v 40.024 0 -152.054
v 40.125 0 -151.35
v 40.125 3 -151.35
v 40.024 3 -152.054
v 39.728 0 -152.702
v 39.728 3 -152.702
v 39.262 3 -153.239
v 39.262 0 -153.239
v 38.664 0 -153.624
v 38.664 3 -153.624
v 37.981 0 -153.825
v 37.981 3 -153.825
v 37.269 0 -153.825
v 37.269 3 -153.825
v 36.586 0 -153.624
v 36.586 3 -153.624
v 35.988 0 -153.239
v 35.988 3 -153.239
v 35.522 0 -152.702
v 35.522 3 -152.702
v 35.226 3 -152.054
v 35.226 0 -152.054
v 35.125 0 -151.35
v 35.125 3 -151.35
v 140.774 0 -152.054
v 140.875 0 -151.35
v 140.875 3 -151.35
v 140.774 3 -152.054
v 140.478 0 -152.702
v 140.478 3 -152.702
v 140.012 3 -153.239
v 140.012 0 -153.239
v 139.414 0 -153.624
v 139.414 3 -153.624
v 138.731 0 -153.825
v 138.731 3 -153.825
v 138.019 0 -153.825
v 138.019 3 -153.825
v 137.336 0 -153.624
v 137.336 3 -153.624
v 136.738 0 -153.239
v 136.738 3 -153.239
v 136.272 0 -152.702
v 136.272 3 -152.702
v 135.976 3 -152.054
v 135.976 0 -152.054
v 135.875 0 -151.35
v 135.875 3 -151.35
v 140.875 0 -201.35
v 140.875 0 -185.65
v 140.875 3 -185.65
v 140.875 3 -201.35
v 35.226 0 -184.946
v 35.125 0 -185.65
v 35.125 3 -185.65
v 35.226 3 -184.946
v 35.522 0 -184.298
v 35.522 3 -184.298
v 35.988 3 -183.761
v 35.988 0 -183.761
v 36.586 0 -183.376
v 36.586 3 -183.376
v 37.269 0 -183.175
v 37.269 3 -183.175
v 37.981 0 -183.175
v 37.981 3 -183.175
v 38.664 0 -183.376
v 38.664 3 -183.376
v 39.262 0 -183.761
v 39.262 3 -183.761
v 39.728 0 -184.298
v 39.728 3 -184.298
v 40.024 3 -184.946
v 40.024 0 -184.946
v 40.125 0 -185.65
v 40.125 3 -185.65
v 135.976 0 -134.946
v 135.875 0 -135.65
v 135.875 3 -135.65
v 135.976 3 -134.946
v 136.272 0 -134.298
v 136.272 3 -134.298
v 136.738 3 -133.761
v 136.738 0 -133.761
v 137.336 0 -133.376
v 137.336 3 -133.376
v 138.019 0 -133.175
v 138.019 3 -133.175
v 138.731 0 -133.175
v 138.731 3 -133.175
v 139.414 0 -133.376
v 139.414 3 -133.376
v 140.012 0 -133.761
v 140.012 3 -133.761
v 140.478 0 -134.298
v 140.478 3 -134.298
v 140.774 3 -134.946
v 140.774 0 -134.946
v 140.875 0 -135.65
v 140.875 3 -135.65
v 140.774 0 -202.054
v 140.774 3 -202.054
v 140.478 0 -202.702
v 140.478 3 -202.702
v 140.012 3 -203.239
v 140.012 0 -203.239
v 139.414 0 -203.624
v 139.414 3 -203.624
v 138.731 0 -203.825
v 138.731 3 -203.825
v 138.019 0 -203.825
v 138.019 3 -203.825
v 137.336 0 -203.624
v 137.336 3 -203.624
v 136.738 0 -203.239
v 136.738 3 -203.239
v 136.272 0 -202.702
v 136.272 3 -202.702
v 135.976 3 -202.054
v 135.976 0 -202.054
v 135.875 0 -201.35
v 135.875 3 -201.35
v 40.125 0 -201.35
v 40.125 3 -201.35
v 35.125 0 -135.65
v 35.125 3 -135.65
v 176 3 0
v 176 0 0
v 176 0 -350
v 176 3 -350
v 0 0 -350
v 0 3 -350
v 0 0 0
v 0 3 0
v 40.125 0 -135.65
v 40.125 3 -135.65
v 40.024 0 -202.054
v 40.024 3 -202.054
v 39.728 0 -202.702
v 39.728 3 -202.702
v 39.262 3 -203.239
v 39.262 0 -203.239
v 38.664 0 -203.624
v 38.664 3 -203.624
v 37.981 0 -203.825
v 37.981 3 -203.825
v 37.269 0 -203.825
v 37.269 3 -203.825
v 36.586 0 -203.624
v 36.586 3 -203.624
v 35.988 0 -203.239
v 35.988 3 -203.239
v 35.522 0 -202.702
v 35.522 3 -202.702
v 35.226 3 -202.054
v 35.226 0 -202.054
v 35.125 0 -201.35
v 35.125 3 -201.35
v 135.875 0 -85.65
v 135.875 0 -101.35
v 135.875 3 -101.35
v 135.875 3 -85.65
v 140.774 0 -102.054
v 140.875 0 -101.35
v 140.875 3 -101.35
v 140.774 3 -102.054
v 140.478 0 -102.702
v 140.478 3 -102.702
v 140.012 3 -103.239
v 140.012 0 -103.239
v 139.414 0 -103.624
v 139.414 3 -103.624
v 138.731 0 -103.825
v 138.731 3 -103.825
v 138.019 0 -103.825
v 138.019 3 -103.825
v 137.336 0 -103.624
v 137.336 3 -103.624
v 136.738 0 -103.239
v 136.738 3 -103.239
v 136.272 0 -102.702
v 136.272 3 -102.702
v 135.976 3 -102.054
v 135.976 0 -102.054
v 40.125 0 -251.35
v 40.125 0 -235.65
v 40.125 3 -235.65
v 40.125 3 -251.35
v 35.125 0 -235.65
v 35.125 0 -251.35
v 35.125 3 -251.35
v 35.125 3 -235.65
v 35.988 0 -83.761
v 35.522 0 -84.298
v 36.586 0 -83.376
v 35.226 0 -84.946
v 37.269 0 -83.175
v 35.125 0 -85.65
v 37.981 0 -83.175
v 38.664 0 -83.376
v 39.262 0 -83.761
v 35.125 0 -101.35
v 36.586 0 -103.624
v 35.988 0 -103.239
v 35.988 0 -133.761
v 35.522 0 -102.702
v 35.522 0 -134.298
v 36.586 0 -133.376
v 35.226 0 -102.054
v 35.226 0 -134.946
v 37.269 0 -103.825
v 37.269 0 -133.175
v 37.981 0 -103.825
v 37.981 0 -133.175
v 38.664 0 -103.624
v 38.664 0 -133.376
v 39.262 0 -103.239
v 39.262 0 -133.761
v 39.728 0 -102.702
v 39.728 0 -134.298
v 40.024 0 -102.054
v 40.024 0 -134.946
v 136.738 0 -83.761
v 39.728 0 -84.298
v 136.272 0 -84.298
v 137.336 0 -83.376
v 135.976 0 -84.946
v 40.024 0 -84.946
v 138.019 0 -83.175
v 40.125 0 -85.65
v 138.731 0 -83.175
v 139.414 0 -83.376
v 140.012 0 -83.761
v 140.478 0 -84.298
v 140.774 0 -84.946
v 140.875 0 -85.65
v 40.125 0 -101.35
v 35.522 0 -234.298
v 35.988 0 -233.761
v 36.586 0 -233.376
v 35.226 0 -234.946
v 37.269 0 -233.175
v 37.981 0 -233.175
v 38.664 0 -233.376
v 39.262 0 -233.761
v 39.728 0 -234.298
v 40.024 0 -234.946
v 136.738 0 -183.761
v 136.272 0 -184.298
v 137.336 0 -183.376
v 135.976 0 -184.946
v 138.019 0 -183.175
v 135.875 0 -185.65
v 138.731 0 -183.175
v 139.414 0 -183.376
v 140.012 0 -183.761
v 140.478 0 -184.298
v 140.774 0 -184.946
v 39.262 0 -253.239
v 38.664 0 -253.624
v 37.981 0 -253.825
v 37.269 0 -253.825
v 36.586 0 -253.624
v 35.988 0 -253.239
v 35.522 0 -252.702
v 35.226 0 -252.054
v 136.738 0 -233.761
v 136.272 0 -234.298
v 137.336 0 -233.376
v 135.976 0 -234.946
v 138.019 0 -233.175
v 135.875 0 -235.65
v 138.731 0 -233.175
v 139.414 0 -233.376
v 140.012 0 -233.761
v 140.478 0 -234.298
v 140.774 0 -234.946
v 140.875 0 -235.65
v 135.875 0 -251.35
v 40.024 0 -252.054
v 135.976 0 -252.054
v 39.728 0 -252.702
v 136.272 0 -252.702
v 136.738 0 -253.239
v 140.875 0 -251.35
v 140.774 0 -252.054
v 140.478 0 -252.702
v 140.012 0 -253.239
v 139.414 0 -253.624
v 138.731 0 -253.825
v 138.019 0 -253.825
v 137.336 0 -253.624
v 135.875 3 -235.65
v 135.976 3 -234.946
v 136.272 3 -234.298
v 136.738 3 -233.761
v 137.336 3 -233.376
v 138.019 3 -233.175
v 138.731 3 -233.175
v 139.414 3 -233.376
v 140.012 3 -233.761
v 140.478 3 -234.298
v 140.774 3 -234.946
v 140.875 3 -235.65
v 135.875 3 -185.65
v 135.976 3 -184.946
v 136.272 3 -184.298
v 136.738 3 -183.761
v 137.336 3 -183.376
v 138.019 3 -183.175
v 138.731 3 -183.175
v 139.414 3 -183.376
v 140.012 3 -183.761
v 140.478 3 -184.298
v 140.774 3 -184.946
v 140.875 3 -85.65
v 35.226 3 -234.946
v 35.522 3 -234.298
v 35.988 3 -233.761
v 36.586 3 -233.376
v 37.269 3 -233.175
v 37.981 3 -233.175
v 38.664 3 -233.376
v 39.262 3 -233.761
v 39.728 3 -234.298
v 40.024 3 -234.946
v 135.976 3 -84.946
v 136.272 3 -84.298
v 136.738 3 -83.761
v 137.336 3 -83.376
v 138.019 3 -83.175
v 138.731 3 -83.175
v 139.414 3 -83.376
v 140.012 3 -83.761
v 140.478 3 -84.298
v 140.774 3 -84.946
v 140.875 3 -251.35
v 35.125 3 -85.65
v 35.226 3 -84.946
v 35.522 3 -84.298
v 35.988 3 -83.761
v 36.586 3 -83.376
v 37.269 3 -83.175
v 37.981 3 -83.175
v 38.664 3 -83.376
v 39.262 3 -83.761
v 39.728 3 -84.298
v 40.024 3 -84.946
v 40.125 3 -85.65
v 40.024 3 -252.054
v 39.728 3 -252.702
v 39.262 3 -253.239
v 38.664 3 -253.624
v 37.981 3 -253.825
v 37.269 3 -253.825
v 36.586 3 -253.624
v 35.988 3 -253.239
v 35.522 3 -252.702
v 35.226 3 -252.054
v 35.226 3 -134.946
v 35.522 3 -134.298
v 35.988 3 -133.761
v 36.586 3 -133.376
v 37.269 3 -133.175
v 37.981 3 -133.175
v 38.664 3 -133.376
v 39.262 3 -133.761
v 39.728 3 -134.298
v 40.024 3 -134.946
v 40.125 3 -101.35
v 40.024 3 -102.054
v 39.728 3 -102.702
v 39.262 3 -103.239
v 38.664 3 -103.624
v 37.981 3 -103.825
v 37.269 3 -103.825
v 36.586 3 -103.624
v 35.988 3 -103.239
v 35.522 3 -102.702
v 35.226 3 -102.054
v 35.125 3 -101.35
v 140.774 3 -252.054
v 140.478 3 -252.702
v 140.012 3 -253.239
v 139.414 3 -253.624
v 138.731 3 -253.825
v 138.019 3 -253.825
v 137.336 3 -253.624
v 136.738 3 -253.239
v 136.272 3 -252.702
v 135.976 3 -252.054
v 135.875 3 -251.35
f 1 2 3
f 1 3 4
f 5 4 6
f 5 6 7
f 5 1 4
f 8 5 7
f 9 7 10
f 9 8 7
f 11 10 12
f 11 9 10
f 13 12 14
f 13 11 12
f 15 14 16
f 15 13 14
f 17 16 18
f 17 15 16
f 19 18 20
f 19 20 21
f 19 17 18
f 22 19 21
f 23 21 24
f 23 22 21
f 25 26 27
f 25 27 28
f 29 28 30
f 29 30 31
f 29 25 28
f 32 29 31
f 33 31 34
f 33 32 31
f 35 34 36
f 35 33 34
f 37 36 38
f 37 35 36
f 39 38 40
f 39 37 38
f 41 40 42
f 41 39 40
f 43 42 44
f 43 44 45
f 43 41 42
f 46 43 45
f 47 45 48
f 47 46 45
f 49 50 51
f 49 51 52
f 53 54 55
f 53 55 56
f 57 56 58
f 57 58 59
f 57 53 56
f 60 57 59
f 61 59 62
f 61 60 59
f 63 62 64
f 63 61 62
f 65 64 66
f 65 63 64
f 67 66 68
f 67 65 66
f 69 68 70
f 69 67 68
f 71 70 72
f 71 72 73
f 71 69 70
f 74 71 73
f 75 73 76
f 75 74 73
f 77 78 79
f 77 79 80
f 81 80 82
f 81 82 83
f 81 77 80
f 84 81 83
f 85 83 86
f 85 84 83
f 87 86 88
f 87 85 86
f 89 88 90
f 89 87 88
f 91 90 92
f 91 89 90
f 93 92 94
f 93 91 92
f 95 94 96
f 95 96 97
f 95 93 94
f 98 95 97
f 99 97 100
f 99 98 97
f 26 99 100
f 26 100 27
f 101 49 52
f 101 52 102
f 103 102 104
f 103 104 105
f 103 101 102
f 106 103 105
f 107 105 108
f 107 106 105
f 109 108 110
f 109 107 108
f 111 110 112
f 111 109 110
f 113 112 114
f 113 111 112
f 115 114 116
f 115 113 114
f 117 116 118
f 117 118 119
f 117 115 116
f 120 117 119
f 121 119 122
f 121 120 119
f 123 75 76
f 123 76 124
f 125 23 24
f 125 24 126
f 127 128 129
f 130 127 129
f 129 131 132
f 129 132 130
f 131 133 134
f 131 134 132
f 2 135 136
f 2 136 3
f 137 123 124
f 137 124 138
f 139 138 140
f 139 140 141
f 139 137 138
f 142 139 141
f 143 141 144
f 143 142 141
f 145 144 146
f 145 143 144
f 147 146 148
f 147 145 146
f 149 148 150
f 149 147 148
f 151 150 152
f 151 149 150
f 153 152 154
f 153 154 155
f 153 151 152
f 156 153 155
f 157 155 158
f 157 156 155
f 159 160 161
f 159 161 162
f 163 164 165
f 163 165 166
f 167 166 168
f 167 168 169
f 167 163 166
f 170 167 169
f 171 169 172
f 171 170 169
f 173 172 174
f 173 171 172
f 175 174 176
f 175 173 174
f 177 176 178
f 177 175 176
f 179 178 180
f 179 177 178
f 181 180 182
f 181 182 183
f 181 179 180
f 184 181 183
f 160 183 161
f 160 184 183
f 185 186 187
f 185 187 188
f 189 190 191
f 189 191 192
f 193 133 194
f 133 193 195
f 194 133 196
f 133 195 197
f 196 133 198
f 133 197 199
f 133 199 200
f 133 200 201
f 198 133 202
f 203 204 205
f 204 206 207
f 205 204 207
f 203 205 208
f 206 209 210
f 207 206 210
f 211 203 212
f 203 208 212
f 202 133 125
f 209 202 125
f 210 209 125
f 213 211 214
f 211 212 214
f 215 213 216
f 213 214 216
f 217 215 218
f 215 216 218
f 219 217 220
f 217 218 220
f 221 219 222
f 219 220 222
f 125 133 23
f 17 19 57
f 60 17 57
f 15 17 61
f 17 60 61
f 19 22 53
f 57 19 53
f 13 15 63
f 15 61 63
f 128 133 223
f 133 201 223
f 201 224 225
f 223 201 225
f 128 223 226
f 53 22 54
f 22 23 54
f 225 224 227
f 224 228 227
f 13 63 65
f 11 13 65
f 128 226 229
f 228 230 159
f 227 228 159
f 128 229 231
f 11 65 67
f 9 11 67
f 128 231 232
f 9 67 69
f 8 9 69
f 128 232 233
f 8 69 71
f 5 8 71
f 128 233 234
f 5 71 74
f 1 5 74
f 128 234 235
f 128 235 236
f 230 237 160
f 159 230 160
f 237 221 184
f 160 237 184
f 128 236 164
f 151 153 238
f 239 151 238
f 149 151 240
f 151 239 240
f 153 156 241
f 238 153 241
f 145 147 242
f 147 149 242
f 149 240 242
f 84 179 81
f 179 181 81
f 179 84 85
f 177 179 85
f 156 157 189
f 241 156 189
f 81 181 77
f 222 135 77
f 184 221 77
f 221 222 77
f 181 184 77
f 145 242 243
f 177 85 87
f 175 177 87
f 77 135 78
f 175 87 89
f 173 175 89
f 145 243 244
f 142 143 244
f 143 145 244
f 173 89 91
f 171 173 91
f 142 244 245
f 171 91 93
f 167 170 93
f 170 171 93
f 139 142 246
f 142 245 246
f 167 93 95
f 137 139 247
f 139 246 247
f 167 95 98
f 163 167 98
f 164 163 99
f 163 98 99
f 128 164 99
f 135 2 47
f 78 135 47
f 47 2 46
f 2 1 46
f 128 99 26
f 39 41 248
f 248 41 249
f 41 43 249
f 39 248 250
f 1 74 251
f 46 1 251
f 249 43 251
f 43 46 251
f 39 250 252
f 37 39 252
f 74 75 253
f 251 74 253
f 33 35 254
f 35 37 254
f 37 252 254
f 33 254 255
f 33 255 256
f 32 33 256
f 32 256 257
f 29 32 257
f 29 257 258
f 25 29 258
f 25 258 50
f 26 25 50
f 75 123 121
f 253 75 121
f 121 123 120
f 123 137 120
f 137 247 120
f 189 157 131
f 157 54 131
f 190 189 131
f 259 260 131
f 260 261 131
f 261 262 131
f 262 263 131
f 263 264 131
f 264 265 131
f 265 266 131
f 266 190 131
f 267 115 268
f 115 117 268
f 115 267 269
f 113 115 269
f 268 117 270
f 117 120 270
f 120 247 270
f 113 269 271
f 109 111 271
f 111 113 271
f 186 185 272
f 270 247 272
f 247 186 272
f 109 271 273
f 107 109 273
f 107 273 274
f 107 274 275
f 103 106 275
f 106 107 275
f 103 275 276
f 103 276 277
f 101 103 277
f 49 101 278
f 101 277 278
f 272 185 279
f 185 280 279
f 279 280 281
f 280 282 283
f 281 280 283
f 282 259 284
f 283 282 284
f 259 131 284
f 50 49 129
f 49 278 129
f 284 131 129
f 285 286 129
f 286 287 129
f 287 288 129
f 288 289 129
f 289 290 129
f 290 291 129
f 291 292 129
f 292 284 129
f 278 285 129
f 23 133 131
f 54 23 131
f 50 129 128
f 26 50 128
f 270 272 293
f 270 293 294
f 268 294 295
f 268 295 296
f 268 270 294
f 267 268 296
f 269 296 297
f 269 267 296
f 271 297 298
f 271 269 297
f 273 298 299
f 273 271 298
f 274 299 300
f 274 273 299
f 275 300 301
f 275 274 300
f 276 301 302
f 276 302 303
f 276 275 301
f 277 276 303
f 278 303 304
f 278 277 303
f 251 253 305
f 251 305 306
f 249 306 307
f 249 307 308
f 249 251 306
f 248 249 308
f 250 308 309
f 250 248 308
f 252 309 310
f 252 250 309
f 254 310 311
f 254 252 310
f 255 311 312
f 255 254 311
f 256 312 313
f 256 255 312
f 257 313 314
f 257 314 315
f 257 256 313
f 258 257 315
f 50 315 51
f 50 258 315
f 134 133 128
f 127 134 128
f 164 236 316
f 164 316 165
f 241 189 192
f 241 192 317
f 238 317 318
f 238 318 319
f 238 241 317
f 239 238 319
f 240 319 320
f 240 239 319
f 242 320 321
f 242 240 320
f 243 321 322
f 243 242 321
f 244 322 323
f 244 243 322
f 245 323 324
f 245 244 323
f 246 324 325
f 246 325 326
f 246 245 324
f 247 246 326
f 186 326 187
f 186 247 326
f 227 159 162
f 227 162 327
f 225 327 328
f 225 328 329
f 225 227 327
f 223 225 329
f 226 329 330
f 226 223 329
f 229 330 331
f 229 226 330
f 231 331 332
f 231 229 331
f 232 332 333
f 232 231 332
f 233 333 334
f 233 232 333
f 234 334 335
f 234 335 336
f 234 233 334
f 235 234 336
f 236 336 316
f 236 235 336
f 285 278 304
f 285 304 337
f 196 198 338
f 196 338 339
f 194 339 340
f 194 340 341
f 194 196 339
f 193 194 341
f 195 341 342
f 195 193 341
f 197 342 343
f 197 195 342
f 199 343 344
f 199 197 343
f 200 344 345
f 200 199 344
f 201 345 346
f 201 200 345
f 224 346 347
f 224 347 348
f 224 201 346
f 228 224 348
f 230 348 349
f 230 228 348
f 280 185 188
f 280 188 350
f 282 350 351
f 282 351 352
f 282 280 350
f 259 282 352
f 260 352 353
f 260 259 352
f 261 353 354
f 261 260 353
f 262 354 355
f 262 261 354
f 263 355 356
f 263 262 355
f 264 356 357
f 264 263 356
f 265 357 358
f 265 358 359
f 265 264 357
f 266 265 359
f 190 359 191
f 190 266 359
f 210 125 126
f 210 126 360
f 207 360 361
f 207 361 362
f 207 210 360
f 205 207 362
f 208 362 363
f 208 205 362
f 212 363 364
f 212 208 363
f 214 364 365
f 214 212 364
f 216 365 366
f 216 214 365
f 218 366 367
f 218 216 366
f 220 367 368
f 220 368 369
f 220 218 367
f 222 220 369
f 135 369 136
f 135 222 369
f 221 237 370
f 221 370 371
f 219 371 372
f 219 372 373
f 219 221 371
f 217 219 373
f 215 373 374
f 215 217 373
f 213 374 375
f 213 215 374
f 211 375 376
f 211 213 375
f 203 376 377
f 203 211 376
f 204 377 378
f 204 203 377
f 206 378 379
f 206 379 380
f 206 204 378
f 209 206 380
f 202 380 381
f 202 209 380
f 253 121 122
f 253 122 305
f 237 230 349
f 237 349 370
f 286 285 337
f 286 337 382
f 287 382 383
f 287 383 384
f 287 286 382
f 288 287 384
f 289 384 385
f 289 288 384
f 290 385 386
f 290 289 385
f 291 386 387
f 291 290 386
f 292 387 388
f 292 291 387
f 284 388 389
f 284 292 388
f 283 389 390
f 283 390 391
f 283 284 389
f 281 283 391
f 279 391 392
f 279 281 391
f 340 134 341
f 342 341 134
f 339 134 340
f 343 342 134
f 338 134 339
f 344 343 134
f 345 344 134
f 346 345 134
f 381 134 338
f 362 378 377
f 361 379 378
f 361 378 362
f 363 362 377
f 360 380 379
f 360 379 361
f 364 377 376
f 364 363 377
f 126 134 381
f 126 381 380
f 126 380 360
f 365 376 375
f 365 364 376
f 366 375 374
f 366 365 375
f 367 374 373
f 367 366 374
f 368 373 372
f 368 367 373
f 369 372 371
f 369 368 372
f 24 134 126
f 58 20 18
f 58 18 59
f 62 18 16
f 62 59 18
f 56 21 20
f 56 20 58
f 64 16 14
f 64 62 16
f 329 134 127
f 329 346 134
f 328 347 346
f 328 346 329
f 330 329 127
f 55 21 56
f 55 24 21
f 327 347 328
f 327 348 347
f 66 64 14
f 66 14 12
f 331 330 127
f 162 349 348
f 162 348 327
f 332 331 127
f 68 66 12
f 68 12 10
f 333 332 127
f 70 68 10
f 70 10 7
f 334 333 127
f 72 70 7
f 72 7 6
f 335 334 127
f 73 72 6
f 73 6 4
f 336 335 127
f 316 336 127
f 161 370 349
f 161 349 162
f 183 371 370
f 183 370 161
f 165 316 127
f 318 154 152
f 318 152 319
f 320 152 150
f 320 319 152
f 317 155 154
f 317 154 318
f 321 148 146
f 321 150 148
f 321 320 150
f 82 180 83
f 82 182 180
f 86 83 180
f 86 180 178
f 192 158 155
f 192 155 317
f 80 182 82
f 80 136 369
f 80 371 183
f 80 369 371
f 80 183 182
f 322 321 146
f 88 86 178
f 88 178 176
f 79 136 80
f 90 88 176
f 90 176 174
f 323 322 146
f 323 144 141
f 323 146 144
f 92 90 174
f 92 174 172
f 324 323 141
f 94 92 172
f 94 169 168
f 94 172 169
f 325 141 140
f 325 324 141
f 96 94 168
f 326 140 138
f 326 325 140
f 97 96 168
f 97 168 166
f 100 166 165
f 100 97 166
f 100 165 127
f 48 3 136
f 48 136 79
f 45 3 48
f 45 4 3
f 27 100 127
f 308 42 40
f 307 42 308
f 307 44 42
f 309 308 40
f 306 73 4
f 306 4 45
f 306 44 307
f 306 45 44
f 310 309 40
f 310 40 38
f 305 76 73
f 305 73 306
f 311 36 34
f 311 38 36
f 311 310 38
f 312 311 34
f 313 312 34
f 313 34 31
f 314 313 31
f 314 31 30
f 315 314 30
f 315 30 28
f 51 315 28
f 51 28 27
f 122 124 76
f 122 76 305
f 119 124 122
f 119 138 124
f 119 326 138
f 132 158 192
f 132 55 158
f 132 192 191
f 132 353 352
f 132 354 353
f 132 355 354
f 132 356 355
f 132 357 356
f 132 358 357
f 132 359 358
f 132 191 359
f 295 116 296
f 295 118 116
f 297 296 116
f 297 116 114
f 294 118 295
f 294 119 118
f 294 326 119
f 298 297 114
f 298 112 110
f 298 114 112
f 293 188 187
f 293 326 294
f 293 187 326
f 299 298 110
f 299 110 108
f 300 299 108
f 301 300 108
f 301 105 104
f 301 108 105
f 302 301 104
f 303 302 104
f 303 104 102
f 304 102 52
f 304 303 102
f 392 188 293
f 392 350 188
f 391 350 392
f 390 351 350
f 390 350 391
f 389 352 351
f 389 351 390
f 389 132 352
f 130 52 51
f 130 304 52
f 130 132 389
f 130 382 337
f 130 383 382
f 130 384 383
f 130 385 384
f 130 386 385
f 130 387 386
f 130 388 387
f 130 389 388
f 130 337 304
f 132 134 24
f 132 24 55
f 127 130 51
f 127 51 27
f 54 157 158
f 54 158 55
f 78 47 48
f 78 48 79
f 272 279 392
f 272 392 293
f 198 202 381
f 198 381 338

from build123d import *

# Parameters (mm, degrees)
SKETCH1_W                 = 176
SKETCH1_H                 = 350
BOSS_EXTRUDE1_DEPTH       = 3
F_5_0MM_DOWEL_SLOT1_DEPTH = 3


# Read off the part's stored shape, not the designer's step: Ø5.0mm Dowel Slot1
with BuildPart() as part:
    # Sketch1 → Boss-Extrude1 (new body)
    with BuildSketch(Plane(origin=(0, 0, 0), x_dir=(1, 0, 0), z_dir=(0, 1, 0))):
        with Locations((88, 175)):
            Rectangle(SKETCH1_W, SKETCH1_H)
    extrude(amount=BOSS_EXTRUDE1_DEPTH)

    # Ø5.0mm Dowel Slot1 outline → Ø5.0mm Dowel Slot1 (cut)
    with BuildSketch(Plane(origin=(0, 0, 0), x_dir=(1, 0, 0), z_dir=(0, 1, 0))):
        with BuildLine():
            Line((35.125, 251.35), (35.125, 235.65))
            ThreePointArc((35.125, 235.65), (37.625, 233.15), (40.125, 235.65))
            Line((40.125, 235.65), (40.125, 251.35))
            ThreePointArc((40.125, 251.35), (37.625, 253.85), (35.125, 251.35))
        make_face()
        with BuildLine():
            Line((40.125, 185.65), (40.125, 201.35))
            ThreePointArc((40.125, 201.35), (37.625, 203.85), (35.125, 201.35))
            Line((35.125, 201.35), (35.125, 185.65))
            ThreePointArc((35.125, 185.65), (37.625, 183.15), (40.125, 185.65))
        make_face()
        with BuildLine():
            Line((40.125, 135.65), (40.125, 151.35))
            ThreePointArc((40.125, 151.35), (37.625, 153.85), (35.125, 151.35))
            Line((35.125, 151.35), (35.125, 135.65))
            ThreePointArc((35.125, 135.65), (37.625, 133.15), (40.125, 135.65))
        make_face()
        with BuildLine():
            Line((40.125, 85.65), (40.125, 101.35))
            ThreePointArc((40.125, 101.35), (37.625, 103.85), (35.125, 101.35))
            Line((35.125, 101.35), (35.125, 85.65))
            ThreePointArc((35.125, 85.65), (37.625, 83.15), (40.125, 85.65))
        make_face()
        with BuildLine():
            Line((135.875, 251.35), (135.875, 235.65))
            ThreePointArc((135.875, 235.65), (138.375, 233.15), (140.875, 235.65))
            Line((140.875, 235.65), (140.875, 251.35))
            ThreePointArc((140.875, 251.35), (138.375, 253.85), (135.875, 251.35))
        make_face()
        with BuildLine():
            Line((140.875, 185.65), (140.875, 201.35))
            ThreePointArc((140.875, 201.35), (138.375, 203.85), (135.875, 201.35))
            Line((135.875, 201.35), (135.875, 185.65))
            ThreePointArc((135.875, 185.65), (138.375, 183.15), (140.875, 185.65))
        make_face()
        with BuildLine():
            Line((140.875, 135.65), (140.875, 151.35))
            ThreePointArc((140.875, 151.35), (138.375, 153.85), (135.875, 151.35))
            Line((135.875, 151.35), (135.875, 135.65))
            ThreePointArc((135.875, 135.65), (138.375, 133.15), (140.875, 135.65))
        make_face()
        with BuildLine():
            Line((140.875, 85.65), (140.875, 101.35))
            ThreePointArc((140.875, 101.35), (138.375, 103.85), (135.875, 101.35))
            Line((135.875, 101.35), (135.875, 85.65))
            ThreePointArc((135.875, 85.65), (138.375, 83.15), (140.875, 85.65))
        make_face()
    extrude(amount=F_5_0MM_DOWEL_SLOT1_DEPTH, mode=Mode.SUBTRACT)


solid = part.part
